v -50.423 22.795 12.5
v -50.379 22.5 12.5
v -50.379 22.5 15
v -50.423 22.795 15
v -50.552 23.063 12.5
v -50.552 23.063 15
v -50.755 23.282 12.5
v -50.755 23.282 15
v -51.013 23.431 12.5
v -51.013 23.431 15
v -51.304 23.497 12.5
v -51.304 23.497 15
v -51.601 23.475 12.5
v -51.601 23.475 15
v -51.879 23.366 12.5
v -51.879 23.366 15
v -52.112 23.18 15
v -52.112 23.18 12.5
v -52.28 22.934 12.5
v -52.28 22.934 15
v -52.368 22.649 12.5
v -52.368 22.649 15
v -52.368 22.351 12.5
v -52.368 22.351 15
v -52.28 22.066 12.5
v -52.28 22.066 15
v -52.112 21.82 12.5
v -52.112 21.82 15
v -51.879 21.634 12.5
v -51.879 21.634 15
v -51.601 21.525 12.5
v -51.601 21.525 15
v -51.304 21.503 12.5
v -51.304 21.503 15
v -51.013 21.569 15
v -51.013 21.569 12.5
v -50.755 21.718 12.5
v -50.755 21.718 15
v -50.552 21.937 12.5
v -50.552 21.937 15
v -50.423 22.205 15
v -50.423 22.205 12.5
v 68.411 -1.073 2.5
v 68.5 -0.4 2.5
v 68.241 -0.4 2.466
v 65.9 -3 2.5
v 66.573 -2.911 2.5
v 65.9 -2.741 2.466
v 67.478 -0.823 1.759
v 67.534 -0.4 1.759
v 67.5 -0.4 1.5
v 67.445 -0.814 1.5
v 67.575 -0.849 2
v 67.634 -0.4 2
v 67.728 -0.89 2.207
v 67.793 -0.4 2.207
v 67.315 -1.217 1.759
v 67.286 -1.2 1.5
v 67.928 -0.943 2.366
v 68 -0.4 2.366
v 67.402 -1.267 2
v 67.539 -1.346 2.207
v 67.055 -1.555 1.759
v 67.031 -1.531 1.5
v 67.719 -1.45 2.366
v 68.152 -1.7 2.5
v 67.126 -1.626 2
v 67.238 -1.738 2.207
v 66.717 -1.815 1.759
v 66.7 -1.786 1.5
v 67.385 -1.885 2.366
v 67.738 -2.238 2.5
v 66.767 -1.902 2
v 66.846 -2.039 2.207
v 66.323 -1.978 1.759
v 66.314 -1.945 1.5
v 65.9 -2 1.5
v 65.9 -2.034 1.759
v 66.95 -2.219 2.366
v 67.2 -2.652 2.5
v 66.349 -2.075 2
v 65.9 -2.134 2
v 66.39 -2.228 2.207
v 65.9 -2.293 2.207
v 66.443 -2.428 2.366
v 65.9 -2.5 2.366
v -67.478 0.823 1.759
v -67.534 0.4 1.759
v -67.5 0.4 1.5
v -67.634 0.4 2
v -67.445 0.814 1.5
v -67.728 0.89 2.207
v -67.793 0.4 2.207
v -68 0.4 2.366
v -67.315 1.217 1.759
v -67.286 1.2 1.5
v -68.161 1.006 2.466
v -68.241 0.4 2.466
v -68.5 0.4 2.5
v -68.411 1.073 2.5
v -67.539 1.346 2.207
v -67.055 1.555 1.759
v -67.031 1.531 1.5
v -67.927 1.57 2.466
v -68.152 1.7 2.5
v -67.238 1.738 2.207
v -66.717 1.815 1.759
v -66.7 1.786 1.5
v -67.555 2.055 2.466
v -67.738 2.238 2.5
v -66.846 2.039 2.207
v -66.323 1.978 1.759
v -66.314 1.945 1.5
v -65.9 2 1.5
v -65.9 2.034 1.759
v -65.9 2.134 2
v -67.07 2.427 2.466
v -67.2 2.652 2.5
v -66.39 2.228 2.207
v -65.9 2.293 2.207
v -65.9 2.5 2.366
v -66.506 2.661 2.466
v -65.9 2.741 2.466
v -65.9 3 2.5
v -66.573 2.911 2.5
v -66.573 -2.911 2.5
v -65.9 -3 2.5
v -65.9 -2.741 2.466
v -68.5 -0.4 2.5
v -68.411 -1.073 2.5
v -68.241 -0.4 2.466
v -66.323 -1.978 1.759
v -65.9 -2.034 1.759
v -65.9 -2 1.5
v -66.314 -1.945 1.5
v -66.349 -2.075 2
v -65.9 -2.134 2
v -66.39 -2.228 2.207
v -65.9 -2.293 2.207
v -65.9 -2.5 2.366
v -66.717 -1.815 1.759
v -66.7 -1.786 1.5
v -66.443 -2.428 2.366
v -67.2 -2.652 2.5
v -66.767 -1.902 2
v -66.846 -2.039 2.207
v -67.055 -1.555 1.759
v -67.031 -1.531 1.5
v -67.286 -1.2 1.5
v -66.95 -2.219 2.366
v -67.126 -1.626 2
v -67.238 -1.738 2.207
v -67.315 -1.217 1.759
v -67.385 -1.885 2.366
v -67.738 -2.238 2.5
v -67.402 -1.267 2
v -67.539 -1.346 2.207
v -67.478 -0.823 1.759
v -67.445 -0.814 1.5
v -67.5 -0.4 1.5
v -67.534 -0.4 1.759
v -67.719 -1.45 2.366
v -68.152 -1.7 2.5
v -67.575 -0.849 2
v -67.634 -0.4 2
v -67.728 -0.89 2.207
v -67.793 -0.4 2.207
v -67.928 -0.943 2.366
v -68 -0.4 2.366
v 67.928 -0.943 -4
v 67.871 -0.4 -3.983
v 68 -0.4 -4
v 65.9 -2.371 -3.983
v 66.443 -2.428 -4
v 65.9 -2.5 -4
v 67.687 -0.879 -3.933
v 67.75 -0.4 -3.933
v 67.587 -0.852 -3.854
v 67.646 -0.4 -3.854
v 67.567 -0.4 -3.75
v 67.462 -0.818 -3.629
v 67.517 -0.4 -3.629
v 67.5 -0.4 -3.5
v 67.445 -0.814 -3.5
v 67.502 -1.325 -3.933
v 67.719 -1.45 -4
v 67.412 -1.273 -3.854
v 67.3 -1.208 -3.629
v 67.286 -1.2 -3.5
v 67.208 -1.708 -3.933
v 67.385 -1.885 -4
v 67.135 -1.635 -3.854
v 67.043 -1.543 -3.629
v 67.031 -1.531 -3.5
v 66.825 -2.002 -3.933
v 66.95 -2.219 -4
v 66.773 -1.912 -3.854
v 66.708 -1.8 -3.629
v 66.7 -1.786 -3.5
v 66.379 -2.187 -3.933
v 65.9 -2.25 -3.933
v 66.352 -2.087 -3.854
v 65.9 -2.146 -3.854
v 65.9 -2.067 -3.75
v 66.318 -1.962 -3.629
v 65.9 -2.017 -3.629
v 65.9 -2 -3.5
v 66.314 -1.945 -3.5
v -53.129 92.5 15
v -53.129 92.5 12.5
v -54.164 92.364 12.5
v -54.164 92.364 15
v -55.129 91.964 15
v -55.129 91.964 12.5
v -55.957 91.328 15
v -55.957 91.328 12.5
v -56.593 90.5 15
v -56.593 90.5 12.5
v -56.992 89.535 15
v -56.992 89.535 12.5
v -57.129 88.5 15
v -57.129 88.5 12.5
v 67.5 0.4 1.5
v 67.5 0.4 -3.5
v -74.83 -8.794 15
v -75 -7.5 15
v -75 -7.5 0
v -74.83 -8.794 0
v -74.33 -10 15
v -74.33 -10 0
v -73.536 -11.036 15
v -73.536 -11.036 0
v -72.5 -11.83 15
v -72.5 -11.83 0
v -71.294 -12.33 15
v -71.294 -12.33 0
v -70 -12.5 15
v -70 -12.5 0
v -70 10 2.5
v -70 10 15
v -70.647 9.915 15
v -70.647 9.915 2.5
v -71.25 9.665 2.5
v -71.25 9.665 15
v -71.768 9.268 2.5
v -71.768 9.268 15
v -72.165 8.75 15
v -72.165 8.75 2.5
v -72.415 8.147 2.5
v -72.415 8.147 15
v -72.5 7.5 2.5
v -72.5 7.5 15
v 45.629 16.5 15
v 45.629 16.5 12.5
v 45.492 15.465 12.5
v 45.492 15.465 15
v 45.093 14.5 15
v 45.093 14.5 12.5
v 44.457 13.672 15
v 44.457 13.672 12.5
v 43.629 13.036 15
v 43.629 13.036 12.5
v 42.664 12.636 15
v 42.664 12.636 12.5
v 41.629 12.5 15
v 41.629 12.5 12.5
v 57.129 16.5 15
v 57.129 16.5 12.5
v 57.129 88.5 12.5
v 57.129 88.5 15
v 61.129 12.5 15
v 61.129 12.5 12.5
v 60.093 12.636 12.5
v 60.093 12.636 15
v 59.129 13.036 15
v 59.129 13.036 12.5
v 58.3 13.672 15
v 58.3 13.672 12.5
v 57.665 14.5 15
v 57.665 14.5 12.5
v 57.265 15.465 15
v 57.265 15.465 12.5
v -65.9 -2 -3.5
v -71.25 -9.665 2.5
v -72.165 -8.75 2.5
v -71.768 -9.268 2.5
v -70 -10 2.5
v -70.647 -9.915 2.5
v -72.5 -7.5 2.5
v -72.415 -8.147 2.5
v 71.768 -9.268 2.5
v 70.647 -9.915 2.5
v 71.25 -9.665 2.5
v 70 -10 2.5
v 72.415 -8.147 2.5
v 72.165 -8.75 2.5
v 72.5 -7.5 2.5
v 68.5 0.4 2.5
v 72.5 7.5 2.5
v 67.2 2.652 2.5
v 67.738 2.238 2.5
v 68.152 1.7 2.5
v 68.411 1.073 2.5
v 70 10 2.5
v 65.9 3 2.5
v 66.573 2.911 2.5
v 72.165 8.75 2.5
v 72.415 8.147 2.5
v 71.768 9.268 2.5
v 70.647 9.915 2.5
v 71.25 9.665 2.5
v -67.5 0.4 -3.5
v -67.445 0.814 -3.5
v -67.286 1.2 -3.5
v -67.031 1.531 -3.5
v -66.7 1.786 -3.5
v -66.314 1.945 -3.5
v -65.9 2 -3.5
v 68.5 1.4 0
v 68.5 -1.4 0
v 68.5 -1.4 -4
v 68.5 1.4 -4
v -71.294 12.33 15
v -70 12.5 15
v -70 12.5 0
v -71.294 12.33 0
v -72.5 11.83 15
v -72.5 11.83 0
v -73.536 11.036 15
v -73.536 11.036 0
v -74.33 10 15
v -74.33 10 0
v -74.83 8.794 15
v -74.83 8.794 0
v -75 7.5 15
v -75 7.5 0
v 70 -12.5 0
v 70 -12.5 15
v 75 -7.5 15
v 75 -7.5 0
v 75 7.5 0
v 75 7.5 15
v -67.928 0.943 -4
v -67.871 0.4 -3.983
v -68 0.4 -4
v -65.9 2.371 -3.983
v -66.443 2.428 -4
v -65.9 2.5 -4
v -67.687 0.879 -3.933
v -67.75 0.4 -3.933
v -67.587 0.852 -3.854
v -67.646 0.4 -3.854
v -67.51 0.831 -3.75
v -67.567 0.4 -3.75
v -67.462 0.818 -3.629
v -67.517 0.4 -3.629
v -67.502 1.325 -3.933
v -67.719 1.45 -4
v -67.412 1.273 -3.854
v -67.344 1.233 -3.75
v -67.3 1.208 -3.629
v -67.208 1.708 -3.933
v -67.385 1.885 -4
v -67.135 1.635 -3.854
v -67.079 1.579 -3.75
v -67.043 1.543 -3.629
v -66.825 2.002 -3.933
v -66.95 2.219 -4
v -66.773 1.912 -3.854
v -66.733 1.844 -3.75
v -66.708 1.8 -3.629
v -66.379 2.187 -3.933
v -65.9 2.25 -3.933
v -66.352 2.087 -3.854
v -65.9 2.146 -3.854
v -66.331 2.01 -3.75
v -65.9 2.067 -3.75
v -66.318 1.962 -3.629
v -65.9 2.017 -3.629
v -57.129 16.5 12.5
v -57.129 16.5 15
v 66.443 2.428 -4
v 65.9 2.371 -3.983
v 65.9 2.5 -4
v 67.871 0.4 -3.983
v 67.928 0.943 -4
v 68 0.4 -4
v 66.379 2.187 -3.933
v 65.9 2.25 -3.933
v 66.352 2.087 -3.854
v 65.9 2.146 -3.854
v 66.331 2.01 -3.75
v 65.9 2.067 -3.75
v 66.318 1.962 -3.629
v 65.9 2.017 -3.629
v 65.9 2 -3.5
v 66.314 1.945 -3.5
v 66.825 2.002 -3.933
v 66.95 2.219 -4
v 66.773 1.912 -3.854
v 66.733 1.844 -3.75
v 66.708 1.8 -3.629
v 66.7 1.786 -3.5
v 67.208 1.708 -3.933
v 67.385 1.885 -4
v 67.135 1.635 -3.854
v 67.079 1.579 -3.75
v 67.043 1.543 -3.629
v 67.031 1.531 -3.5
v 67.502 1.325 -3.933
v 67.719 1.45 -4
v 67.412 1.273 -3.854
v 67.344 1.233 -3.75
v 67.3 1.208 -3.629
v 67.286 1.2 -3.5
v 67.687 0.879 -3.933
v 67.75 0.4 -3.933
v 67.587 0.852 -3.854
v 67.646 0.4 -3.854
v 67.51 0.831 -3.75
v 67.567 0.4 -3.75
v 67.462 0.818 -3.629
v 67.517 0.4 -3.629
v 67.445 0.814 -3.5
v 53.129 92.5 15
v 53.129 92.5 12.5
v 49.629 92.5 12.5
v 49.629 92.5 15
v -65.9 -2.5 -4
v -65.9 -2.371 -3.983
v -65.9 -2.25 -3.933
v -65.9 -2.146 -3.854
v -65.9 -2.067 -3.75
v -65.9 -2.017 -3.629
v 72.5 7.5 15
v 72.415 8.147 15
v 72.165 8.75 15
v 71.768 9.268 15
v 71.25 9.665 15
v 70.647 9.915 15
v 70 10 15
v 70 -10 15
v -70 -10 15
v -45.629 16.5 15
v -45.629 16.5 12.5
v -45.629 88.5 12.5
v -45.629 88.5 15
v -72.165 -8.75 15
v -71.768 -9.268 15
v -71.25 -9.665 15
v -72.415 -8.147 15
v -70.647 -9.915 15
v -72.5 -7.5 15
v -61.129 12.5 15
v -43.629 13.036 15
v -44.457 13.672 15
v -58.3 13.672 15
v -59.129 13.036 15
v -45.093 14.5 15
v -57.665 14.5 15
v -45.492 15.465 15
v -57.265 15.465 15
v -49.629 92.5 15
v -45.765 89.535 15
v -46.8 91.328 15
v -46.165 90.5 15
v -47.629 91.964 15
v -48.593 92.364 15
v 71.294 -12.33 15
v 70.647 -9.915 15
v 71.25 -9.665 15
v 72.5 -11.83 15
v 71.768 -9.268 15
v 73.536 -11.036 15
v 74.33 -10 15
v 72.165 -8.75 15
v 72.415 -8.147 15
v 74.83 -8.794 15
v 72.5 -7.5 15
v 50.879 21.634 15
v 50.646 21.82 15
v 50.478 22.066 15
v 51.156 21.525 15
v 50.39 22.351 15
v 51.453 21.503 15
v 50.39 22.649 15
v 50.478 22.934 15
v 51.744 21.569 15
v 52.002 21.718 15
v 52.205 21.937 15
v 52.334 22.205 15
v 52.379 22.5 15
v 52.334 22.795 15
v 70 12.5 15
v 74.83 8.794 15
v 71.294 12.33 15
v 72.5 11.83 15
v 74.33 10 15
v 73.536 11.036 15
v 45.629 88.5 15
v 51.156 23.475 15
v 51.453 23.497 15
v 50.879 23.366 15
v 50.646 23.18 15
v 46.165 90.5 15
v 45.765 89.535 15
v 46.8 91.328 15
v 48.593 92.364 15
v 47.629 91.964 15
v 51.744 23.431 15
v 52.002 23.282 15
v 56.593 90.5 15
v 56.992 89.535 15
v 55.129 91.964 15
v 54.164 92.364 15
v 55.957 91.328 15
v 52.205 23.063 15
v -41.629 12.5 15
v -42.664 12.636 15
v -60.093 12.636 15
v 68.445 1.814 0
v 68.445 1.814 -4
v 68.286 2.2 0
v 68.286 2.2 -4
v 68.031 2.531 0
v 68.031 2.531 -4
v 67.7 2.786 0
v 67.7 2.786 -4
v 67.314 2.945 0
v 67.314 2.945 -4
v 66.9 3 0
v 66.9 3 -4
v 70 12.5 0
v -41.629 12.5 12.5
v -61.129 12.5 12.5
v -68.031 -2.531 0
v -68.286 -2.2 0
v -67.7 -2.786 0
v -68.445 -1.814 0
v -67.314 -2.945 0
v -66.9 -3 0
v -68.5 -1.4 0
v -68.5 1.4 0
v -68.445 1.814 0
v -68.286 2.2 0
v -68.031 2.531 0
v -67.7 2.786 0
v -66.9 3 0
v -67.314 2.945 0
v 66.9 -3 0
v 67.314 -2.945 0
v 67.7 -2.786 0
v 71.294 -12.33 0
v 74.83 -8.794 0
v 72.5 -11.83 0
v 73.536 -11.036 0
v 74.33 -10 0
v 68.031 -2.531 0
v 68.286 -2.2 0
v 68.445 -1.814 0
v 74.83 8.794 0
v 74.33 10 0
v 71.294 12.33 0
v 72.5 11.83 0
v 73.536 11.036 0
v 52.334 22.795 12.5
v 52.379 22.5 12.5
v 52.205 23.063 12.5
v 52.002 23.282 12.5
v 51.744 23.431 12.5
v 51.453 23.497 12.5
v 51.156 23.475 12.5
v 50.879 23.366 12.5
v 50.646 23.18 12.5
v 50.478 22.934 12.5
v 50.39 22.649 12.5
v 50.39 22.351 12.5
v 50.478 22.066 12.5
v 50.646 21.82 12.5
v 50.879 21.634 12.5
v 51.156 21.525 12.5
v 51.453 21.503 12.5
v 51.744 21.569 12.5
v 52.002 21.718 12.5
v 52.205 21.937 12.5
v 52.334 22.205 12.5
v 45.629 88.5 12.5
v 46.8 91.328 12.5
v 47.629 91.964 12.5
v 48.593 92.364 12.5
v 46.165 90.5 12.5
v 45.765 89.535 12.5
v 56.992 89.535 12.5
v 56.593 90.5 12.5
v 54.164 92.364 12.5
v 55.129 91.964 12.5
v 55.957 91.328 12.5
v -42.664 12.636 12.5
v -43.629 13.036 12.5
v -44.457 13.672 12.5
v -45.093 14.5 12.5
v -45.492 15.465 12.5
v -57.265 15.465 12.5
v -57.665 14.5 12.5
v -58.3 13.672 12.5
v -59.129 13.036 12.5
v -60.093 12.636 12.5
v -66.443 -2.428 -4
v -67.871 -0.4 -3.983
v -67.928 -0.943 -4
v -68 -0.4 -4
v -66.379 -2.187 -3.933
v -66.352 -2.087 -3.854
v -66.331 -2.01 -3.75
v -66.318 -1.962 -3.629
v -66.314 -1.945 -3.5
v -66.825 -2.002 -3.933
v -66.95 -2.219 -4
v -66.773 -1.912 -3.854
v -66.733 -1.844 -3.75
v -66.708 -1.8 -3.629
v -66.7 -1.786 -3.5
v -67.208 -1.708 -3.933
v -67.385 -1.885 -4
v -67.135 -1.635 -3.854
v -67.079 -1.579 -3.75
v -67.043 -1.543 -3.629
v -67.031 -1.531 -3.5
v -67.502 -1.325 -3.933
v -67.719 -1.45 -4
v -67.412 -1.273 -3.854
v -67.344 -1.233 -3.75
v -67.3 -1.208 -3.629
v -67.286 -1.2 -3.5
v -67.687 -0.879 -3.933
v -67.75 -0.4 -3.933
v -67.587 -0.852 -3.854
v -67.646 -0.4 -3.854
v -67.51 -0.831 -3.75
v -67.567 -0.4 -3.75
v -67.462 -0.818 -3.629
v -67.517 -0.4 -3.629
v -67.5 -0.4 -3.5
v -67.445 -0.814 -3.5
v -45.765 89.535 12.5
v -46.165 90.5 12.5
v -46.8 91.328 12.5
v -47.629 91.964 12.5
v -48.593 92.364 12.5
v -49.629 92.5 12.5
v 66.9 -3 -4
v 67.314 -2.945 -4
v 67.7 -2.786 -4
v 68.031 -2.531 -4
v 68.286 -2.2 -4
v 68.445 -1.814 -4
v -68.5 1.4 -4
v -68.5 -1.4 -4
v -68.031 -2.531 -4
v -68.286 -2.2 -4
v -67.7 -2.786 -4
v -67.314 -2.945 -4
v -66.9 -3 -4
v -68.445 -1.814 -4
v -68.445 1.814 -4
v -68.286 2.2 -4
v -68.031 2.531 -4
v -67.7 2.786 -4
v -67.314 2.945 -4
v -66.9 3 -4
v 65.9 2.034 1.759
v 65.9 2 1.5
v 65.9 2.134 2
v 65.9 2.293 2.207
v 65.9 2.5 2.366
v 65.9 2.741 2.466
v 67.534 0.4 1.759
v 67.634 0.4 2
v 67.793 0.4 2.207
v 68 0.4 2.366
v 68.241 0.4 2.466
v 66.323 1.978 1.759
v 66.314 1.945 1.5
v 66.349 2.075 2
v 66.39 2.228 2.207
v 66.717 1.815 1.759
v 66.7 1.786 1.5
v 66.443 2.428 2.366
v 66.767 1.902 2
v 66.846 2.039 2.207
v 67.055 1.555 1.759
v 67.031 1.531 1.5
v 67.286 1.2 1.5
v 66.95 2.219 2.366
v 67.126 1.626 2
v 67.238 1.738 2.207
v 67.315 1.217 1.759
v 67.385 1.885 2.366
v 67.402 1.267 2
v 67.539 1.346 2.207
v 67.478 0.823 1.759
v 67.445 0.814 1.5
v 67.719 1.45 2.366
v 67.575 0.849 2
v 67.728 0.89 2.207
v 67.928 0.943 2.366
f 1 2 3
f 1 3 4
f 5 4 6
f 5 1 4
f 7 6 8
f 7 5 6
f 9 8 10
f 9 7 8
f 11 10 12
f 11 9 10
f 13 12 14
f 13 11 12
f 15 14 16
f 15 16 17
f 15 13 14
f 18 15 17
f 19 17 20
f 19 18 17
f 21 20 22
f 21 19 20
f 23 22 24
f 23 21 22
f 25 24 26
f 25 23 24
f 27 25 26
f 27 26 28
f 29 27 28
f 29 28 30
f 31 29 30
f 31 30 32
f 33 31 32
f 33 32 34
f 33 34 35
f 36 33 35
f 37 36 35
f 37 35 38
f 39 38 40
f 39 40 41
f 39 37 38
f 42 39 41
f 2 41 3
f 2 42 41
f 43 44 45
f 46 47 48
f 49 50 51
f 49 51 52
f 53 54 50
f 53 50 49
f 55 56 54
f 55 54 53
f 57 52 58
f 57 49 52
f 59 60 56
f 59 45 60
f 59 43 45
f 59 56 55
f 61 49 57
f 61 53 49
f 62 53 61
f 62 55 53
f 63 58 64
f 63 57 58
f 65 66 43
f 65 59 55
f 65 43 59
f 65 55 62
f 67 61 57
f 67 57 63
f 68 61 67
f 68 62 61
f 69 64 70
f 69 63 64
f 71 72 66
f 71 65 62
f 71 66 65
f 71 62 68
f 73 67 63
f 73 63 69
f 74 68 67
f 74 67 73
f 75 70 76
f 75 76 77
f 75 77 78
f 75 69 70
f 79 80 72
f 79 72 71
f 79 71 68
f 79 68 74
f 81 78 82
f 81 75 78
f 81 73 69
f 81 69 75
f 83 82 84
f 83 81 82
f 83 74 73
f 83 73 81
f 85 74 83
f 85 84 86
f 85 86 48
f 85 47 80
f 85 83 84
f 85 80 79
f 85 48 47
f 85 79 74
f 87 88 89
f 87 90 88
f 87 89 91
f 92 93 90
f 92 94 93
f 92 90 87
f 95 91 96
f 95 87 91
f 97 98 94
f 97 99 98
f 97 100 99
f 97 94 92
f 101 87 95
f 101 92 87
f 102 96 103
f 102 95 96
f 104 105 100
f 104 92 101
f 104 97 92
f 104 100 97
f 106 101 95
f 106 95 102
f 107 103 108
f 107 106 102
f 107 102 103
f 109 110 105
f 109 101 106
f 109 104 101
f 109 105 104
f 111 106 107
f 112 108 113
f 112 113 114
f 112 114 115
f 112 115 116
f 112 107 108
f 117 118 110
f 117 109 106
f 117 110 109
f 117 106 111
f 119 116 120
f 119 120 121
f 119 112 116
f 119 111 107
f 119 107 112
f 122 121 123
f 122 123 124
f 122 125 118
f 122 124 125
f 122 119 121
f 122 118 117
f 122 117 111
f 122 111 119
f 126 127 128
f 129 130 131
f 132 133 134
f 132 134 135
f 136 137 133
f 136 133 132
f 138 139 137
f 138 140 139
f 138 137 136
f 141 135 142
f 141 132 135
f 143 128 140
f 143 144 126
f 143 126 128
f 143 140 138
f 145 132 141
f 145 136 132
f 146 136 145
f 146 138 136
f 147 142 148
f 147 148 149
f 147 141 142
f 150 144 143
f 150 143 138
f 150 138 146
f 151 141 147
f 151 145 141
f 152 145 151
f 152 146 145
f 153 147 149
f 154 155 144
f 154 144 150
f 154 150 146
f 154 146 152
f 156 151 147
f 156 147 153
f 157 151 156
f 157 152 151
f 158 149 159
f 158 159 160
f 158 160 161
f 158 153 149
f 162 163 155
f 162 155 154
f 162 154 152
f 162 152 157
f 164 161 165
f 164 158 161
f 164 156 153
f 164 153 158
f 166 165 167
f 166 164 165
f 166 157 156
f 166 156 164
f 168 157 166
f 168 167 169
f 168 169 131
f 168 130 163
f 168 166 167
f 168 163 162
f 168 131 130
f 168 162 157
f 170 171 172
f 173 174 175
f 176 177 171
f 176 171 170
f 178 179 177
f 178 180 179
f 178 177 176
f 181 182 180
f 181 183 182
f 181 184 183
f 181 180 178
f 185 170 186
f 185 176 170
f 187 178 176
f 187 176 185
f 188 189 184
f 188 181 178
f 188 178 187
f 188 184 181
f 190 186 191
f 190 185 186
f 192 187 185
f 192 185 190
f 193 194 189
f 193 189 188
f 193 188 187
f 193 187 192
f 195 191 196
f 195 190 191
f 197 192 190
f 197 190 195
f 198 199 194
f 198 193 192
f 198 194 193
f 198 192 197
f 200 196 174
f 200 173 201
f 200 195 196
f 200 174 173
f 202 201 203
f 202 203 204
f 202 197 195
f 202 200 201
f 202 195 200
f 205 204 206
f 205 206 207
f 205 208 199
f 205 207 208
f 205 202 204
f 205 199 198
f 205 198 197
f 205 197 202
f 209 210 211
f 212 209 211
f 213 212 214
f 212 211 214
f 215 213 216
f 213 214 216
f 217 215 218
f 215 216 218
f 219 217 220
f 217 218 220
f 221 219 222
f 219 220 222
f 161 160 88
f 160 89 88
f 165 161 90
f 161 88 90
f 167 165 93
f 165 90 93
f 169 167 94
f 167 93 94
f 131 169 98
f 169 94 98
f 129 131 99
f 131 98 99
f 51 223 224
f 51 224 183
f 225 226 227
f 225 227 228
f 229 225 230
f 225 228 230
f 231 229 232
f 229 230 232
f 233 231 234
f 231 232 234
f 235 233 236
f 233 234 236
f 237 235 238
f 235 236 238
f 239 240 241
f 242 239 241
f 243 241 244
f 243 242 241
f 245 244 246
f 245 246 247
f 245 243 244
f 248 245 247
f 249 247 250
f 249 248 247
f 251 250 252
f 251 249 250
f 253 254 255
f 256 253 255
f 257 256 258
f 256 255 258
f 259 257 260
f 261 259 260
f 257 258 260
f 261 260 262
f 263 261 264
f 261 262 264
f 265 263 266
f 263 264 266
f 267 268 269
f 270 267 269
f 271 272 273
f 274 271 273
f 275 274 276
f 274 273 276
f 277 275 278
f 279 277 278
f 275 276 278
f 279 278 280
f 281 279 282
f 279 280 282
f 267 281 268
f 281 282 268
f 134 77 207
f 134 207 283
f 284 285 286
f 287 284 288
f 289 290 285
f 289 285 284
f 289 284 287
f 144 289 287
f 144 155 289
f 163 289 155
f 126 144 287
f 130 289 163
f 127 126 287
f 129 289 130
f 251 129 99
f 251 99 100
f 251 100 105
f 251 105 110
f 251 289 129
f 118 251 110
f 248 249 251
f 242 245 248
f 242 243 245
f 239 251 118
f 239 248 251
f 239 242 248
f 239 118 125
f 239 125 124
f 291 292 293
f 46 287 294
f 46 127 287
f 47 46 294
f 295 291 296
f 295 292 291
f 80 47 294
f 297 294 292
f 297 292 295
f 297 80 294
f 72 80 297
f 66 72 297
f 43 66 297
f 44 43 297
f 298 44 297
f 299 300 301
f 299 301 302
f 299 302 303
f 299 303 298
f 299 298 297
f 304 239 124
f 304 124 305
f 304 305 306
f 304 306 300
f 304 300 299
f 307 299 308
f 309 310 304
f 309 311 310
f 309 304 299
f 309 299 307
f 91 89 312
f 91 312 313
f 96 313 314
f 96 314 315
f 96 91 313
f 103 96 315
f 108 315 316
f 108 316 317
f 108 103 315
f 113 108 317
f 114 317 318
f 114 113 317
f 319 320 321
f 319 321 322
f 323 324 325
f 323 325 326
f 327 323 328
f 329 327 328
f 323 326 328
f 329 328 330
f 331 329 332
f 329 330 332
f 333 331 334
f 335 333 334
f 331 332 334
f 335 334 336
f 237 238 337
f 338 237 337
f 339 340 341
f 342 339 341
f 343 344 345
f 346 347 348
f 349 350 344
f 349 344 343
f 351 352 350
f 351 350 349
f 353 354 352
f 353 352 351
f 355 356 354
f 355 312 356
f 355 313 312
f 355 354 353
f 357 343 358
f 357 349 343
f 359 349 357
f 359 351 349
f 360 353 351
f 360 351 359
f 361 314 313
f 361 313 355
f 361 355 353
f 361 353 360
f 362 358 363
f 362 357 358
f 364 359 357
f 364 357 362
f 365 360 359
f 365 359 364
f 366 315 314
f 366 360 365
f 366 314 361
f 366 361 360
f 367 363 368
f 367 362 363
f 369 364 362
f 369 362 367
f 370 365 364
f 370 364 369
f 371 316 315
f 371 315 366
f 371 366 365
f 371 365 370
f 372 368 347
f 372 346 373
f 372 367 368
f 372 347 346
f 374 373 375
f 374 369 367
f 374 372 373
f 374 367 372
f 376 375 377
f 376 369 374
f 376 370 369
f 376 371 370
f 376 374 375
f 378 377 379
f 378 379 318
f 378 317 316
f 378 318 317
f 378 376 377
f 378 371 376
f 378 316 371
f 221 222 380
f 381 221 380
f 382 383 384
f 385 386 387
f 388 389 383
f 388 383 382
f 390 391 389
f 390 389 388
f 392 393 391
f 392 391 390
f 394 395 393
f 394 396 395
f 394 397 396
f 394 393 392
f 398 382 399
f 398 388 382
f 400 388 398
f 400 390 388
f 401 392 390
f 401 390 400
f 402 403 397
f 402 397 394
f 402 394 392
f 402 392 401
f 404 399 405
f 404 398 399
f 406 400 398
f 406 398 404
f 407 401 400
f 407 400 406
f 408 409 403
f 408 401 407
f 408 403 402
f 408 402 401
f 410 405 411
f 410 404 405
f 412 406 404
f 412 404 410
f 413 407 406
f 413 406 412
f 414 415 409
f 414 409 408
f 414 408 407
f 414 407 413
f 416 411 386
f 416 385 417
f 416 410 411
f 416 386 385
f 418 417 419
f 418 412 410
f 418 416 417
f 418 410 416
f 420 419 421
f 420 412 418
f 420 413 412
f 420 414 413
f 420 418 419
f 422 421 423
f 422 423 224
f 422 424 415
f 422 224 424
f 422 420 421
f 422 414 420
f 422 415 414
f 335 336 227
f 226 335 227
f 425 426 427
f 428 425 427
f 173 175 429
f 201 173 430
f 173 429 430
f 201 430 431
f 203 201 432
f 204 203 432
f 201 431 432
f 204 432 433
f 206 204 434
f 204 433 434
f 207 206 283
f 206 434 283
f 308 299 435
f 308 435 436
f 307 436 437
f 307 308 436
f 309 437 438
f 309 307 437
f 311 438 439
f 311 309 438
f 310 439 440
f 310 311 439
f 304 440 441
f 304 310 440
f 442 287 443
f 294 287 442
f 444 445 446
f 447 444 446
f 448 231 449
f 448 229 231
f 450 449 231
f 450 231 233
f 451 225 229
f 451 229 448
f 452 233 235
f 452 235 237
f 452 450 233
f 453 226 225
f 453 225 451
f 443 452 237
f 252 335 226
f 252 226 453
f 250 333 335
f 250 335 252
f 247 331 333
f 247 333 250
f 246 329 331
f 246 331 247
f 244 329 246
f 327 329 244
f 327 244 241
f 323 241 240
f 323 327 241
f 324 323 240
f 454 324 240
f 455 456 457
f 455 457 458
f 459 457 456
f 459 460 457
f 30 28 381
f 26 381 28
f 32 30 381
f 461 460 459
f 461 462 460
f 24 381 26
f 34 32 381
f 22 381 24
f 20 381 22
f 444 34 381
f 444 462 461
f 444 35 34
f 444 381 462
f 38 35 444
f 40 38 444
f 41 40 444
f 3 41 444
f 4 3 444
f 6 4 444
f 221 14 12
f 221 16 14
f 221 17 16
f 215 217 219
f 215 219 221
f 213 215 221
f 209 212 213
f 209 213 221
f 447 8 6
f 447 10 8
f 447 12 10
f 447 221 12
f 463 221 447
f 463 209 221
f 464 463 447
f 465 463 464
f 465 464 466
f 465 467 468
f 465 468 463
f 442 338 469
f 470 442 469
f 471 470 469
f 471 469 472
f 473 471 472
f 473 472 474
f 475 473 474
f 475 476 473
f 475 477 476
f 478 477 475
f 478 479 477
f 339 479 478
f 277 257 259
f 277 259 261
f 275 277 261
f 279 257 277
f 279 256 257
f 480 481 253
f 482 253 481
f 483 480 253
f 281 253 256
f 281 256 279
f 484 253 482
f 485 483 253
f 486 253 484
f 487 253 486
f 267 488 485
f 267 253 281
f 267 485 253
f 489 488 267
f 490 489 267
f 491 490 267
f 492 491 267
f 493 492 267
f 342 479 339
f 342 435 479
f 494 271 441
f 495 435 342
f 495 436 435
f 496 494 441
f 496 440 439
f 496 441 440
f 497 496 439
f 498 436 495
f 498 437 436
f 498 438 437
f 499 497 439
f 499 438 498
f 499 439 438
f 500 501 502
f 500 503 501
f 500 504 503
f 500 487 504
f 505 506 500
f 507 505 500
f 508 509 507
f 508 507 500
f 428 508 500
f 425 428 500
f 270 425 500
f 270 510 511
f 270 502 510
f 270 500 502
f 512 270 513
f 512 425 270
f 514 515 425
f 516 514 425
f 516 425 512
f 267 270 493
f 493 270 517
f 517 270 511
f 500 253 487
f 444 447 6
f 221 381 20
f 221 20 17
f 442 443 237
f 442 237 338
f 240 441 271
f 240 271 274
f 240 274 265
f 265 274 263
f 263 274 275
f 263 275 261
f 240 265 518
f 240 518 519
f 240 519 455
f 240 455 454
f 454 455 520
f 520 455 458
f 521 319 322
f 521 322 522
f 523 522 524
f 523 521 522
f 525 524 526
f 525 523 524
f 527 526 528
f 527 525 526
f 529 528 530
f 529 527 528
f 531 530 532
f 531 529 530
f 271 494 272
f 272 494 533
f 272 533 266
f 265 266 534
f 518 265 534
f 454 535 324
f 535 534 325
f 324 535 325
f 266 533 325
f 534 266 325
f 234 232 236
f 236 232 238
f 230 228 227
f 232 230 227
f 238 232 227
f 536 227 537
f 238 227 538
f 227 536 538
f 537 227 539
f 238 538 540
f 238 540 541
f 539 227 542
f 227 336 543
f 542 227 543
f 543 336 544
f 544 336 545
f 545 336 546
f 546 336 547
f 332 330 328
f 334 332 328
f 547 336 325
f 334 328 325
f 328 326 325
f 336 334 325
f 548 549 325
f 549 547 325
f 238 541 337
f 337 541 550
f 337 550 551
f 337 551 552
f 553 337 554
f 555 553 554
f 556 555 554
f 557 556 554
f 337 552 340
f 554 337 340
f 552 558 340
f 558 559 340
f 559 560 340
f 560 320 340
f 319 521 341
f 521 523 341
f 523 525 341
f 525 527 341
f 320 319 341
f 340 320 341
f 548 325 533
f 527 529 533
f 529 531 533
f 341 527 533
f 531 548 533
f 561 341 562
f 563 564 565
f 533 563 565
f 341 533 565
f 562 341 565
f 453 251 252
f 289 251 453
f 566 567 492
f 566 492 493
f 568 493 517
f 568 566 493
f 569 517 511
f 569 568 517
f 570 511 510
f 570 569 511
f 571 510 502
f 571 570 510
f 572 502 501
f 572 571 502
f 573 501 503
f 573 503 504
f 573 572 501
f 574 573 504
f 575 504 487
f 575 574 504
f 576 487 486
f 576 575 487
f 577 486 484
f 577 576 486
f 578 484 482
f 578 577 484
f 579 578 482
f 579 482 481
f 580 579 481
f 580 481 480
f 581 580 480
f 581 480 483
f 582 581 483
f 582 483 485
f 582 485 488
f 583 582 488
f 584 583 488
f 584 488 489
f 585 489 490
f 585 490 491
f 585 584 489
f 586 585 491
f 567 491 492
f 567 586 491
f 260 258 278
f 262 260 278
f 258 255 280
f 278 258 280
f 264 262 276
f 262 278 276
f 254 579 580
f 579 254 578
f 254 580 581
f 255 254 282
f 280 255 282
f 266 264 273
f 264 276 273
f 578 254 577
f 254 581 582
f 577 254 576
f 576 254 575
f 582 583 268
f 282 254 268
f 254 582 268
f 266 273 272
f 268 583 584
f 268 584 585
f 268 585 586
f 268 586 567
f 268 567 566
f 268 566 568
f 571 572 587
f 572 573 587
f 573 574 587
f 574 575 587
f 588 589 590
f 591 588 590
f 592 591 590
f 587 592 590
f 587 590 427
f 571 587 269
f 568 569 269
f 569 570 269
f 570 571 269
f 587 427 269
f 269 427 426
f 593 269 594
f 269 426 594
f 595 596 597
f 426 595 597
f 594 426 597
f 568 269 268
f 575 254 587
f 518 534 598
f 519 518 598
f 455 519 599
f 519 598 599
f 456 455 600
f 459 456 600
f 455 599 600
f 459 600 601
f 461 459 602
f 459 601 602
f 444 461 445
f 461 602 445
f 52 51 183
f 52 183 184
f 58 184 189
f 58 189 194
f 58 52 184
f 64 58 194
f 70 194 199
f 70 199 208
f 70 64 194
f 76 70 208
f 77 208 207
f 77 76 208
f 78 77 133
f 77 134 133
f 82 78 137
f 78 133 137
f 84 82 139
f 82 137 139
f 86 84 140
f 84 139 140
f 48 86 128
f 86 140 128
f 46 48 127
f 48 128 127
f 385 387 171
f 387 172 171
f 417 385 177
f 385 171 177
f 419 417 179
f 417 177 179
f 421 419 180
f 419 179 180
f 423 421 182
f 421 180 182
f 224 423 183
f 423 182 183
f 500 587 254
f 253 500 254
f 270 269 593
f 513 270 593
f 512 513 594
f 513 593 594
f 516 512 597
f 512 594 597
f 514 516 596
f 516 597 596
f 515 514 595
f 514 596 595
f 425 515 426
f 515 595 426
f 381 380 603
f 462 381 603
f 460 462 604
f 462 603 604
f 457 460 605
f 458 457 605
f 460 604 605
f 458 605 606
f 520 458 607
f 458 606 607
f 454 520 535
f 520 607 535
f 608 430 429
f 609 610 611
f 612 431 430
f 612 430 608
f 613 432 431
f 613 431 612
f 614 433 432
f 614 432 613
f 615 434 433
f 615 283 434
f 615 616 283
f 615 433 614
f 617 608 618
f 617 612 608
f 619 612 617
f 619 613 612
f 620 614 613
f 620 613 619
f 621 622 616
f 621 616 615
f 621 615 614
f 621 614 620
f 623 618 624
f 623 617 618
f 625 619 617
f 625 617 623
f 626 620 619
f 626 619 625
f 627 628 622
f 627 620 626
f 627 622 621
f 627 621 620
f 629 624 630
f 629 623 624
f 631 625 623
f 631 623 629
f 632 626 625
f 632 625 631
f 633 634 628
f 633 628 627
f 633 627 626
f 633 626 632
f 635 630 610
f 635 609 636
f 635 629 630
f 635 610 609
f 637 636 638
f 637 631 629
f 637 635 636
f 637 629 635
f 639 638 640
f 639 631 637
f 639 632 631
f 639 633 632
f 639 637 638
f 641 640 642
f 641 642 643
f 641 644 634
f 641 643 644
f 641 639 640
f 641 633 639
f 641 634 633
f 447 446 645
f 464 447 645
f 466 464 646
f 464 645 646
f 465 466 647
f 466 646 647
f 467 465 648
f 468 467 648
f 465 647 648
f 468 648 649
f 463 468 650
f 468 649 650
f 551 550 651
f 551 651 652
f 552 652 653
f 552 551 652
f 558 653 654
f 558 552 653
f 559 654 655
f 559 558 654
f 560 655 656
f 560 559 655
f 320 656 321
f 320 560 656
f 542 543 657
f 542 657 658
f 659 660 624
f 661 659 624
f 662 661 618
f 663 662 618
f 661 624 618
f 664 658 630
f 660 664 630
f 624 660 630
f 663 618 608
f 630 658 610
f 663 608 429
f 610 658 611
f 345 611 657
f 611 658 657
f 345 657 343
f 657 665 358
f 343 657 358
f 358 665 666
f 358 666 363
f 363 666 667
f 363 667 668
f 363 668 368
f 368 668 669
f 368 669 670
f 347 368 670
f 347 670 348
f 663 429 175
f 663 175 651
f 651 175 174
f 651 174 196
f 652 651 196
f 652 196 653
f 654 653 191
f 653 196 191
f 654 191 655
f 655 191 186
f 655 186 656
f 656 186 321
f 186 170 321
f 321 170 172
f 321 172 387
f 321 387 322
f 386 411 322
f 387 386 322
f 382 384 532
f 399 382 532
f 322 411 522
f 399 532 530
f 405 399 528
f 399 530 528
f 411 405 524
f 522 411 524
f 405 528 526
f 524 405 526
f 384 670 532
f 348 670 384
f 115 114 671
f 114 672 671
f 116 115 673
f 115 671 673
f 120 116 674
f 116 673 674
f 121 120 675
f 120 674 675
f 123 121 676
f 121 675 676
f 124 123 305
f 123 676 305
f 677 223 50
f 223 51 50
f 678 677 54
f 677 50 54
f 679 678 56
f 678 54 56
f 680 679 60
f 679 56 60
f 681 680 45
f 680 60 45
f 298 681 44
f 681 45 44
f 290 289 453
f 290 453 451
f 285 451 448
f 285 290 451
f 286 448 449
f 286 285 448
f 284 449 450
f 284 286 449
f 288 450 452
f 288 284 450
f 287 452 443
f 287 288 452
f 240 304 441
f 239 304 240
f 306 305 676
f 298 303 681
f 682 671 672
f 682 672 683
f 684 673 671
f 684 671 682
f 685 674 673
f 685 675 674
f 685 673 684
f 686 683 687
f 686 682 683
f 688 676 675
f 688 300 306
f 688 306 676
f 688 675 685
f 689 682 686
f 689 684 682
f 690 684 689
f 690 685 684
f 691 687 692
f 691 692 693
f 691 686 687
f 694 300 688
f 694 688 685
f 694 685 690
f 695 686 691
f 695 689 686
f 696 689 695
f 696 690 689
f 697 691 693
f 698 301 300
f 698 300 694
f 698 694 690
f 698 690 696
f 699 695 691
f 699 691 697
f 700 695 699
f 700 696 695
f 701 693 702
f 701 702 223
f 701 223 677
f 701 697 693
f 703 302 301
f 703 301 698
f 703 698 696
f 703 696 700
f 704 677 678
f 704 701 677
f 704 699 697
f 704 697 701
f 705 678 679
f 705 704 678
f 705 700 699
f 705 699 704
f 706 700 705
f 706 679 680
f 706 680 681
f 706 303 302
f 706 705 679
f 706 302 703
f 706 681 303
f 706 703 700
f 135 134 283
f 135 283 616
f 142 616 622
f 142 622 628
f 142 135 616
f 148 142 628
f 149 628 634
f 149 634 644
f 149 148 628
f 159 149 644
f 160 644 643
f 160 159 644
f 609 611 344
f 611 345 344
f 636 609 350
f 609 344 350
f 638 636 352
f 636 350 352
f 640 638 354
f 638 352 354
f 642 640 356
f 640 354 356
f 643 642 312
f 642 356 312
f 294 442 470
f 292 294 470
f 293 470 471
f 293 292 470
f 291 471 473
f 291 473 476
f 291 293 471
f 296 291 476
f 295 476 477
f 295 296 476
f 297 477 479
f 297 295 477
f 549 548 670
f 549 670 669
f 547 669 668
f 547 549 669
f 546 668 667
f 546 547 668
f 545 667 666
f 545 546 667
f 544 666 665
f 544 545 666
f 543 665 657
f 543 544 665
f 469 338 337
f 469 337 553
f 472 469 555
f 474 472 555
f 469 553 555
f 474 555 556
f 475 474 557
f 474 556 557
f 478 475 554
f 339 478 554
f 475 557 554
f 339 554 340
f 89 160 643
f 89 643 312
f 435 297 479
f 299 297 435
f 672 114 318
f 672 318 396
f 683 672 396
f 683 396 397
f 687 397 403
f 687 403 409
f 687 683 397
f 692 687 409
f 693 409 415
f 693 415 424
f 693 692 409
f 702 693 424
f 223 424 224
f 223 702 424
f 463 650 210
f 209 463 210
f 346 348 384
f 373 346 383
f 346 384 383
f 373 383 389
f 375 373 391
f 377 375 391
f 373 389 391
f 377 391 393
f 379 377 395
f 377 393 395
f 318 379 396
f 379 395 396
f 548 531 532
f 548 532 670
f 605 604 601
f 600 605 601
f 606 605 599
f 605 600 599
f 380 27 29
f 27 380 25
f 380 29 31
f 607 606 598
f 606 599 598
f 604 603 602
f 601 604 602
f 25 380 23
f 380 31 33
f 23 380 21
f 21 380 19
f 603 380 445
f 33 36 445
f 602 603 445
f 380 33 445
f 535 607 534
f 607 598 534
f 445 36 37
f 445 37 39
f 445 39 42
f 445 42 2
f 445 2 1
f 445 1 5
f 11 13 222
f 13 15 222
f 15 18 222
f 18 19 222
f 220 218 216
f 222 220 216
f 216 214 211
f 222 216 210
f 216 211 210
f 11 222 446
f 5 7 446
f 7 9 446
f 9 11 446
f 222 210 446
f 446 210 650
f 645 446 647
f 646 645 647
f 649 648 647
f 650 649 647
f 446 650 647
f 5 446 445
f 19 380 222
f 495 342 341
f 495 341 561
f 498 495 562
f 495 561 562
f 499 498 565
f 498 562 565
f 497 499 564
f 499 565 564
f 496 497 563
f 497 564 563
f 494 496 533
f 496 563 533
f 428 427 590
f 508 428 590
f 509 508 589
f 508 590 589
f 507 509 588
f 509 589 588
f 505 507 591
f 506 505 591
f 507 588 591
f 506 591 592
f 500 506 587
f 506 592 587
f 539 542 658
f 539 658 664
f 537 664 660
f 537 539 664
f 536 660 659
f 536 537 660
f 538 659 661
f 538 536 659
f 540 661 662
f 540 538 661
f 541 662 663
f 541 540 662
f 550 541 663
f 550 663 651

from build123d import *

# Parameters (mm, degrees)
F1_DEPTH = 15
F2_T     = -2.5
F3_DEPTH = 3
F4_DEPTH = 4
F5_R     = 0.5
F6_R     = 1
F7_START = 12.5
F0_R     = 1
F7_DEPTH = 2.5


with BuildPart() as f1:
    # F0 (on Top) → F1 (new body)
    with BuildSketch(Plane.XY):
        with BuildLine():
            ThreePointArc((75, 7.5), (73.5355339059, 11.0355339059), (70, 12.5))
            Line((70, 12.5), (61.1287162602, 12.5))
            Line((61.1287162602, 12.5), (41.6287162602, 12.5))
            Line((41.6287162602, 12.5), (-41.6287162602, 12.5))
            Line((-41.6287162602, 12.5), (-61.1287162602, 12.5))
            Line((-61.1287162602, 12.5), (-70, 12.5))
            ThreePointArc((-70, 12.5), (-73.5355339059, 11.0355339059), (-75, 7.5))
            Line((-75, 7.5), (-75, -7.5))
            ThreePointArc((-75, -7.5), (-73.5355339059, -11.0355339059), (-70, -12.5))
            Line((-70, -12.5), (70, -12.5))
            ThreePointArc((70, -12.5), (73.5355339059, -11.0355339059), (75, -7.5))
            Line((75, -7.5), (75, 7.5))
        make_face()
        with BuildLine():
            Line((-66.8997643389, 3), (66.8997643389, 3))
            ThreePointArc((66.8997643389, 3), (68.0313018263, 2.5313018263), (68.5, 1.3997643389))
            Line((68.5, 1.3997643389), (68.5, -1.3997643389))
            ThreePointArc((68.5, -1.3997643389), (68.0313018263, -2.5313018263), (66.8997643389, -3))
            Line((66.8997643389, -3), (-66.8997643389, -3))
            ThreePointArc((-66.8997643389, -3), (-68.0313018263, -2.5313018263), (-68.5, -1.3997643389))
            Line((-68.5, -1.3997643389), (-68.5, 1.3997643389))
            ThreePointArc((-68.5, 1.3997643389), (-68.0313018263, 2.5313018263), (-66.8997643389, 3))
        make_face(mode=Mode.SUBTRACT)
        with BuildLine():
            ThreePointArc((68.5, 1.3997643389), (68.0313018263, 2.5313018263), (66.8997643389, 3))
            Line((66.8997643389, 3), (-66.8997643389, 3))
            ThreePointArc((-66.8997643389, 3), (-68.0313018263, 2.5313018263), (-68.5, 1.3997643389))
            Line((-68.5, 1.3997643389), (-68.5, -1.3997643389))
            ThreePointArc((-68.5, -1.3997643389), (-68.0313018263, -2.5313018263), (-66.8997643389, -3))
            Line((-66.8997643389, -3), (66.8997643389, -3))
            ThreePointArc((66.8997643389, -3), (68.0313018263, -2.5313018263), (68.5, -1.3997643389))
            Line((68.5, -1.3997643389), (68.5, 1.3997643389))
        make_face()
        with BuildLine():
            ThreePointArc((67.5, -0.3997643389), (67.0313018263, -1.5313018263), (65.8997643389, -2))
            Line((65.8997643389, -2), (-65.8997643389, -2))
            ThreePointArc((-65.8997643389, -2), (-67.0313018263, -1.5313018263), (-67.5, -0.3997643389))
            Line((-67.5, -0.3997643389), (-67.5, 0.3997643389))
            ThreePointArc((-67.5, 0.3997643389), (-67.0313018263, 1.5313018263), (-65.8997643389, 2))
            Line((-65.8997643389, 2), (65.8997643389, 2))
            ThreePointArc((65.8997643389, 2), (67.0313018263, 1.5313018263), (67.5, 0.3997643389))
            Line((67.5, 0.3997643389), (67.5, -0.3997643389))
        make_face(mode=Mode.SUBTRACT)
        with BuildLine():
            Line((-65.8997643389, -2), (65.8997643389, -2))
            ThreePointArc((65.8997643389, -2), (67.0313018263, -1.5313018263), (67.5, -0.3997643389))
            Line((67.5, -0.3997643389), (67.5, 0.3997643389))
            ThreePointArc((67.5, 0.3997643389), (67.0313018263, 1.5313018263), (65.8997643389, 2))
            Line((65.8997643389, 2), (-65.8997643389, 2))
            ThreePointArc((-65.8997643389, 2), (-67.0313018263, 1.5313018263), (-67.5, 0.3997643389))
            Line((-67.5, 0.3997643389), (-67.5, -0.3997643389))
            ThreePointArc((-67.5, -0.3997643389), (-67.0313018263, -1.5313018263), (-65.8997643389, -2))
        make_face()
    extrude(amount=F1_DEPTH)

    # F2
    f2_openings = [f1.faces().sort_by_distance(p)[0] for p in [
        (0, 0, 15),
    ]]
    offset(amount=F2_T, openings=f2_openings)

    # F0 (on Top) → F3 (cut)
    with BuildSketch(Plane.XY):
        with BuildLine():
            Line((-65.8997643389, -2), (65.8997643389, -2))
            ThreePointArc((65.8997643389, -2), (67.0313018263, -1.5313018263), (67.5, -0.3997643389))
            Line((67.5, -0.3997643389), (67.5, 0.3997643389))
            ThreePointArc((67.5, 0.3997643389), (67.0313018263, 1.5313018263), (65.8997643389, 2))
            Line((65.8997643389, 2), (-65.8997643389, 2))
            ThreePointArc((-65.8997643389, 2), (-67.0313018263, 1.5313018263), (-67.5, 0.3997643389))
            Line((-67.5, 0.3997643389), (-67.5, -0.3997643389))
            ThreePointArc((-67.5, -0.3997643389), (-67.0313018263, -1.5313018263), (-65.8997643389, -2))
        make_face()
    extrude(amount=F3_DEPTH, mode=Mode.SUBTRACT)

    # F0 (on Top) → F4 (join)
    with BuildSketch(Plane.XY):
        with BuildLine():
            ThreePointArc((68.5, 1.3997643389), (68.0313018263, 2.5313018263), (66.8997643389, 3))
            Line((66.8997643389, 3), (-66.8997643389, 3))
            ThreePointArc((-66.8997643389, 3), (-68.0313018263, 2.5313018263), (-68.5, 1.3997643389))
            Line((-68.5, 1.3997643389), (-68.5, -1.3997643389))
            ThreePointArc((-68.5, -1.3997643389), (-68.0313018263, -2.5313018263), (-66.8997643389, -3))
            Line((-66.8997643389, -3), (66.8997643389, -3))
            ThreePointArc((66.8997643389, -3), (68.0313018263, -2.5313018263), (68.5, -1.3997643389))
            Line((68.5, -1.3997643389), (68.5, 1.3997643389))
        make_face()
        with BuildLine():
            ThreePointArc((67.5, -0.3997643389), (67.0313018263, -1.5313018263), (65.8997643389, -2))
            Line((65.8997643389, -2), (-65.8997643389, -2))
            ThreePointArc((-65.8997643389, -2), (-67.0313018263, -1.5313018263), (-67.5, -0.3997643389))
            Line((-67.5, -0.3997643389), (-67.5, 0.3997643389))
            ThreePointArc((-67.5, 0.3997643389), (-67.0313018263, 1.5313018263), (-65.8997643389, 2))
            Line((-65.8997643389, 2), (65.8997643389, 2))
            ThreePointArc((65.8997643389, 2), (67.0313018263, 1.5313018263), (67.5, 0.3997643389))
            Line((67.5, 0.3997643389), (67.5, -0.3997643389))
        make_face(mode=Mode.SUBTRACT)
    extrude(amount=-F4_DEPTH)

    # F5
    f5_edges = [f1.edges().sort_by_distance(p)[0] for p in [
        (0, -2, -4),
        (-67.031302, -1.531302, -4),
    ]]
    fillet(f5_edges, radius=F5_R)

    # F6
    f6_edges = [f1.edges().sort_by_distance(p)[0] for p in [
        (0, 2, 2.5),
    ]]
    fillet(f6_edges, radius=F6_R)

    # F0 (on Top) → F7 (join)
    with BuildSketch(Plane.XY.offset(F7_START)):
        with BuildLine():
            Line((41.6287162602, 12.5), (61.1287162602, 12.5))
            ThreePointArc((61.1287162602, 12.5), (58.3002891354, 13.6715728753), (57.1287162602, 16.5))
            Line((57.1287162602, 16.5), (57.1287162602, 88.5))
            ThreePointArc((57.1287162602, 88.5), (55.9571433849, 91.3284271247), (53.1287162602, 92.5))
            Line((53.1287162602, 92.5), (49.6287162602, 92.5))
            ThreePointArc((49.6287162602, 92.5), (46.8002891354, 91.3284271247), (45.6287162602, 88.5))
            Line((45.6287162602, 88.5), (45.6287162602, 16.5))
            ThreePointArc((45.6287162602, 16.5), (44.4571433849, 13.6715728753), (41.6287162602, 12.5))
        make_face()
        with Locations((51.3787162602, 22.5)):
            Circle(F0_R, mode=Mode.SUBTRACT)
        with BuildLine():
            Line((-61.1287162602, 12.5), (-41.6287162602, 12.5))
            ThreePointArc((-41.6287162602, 12.5), (-44.4571433849, 13.6715728753), (-45.6287162602, 16.5))
            Line((-45.6287162602, 16.5), (-45.6287162602, 88.5))
            ThreePointArc((-45.6287162602, 88.5), (-46.8002891354, 91.3284271247), (-49.6287162602, 92.5))
            Line((-49.6287162602, 92.5), (-53.1287162602, 92.5))
            ThreePointArc((-53.1287162602, 92.5), (-55.9571433849, 91.3284271247), (-57.1287162602, 88.5))
            Line((-57.1287162602, 88.5), (-57.1287162602, 16.5))
            ThreePointArc((-57.1287162602, 16.5), (-58.3002891354, 13.6715728753), (-61.1287162602, 12.5))
        make_face()
        with Locations((-51.3787162602, 22.5)):
            Circle(F0_R, mode=Mode.SUBTRACT)
    extrude(amount=F7_DEPTH)


solid = f1.part
